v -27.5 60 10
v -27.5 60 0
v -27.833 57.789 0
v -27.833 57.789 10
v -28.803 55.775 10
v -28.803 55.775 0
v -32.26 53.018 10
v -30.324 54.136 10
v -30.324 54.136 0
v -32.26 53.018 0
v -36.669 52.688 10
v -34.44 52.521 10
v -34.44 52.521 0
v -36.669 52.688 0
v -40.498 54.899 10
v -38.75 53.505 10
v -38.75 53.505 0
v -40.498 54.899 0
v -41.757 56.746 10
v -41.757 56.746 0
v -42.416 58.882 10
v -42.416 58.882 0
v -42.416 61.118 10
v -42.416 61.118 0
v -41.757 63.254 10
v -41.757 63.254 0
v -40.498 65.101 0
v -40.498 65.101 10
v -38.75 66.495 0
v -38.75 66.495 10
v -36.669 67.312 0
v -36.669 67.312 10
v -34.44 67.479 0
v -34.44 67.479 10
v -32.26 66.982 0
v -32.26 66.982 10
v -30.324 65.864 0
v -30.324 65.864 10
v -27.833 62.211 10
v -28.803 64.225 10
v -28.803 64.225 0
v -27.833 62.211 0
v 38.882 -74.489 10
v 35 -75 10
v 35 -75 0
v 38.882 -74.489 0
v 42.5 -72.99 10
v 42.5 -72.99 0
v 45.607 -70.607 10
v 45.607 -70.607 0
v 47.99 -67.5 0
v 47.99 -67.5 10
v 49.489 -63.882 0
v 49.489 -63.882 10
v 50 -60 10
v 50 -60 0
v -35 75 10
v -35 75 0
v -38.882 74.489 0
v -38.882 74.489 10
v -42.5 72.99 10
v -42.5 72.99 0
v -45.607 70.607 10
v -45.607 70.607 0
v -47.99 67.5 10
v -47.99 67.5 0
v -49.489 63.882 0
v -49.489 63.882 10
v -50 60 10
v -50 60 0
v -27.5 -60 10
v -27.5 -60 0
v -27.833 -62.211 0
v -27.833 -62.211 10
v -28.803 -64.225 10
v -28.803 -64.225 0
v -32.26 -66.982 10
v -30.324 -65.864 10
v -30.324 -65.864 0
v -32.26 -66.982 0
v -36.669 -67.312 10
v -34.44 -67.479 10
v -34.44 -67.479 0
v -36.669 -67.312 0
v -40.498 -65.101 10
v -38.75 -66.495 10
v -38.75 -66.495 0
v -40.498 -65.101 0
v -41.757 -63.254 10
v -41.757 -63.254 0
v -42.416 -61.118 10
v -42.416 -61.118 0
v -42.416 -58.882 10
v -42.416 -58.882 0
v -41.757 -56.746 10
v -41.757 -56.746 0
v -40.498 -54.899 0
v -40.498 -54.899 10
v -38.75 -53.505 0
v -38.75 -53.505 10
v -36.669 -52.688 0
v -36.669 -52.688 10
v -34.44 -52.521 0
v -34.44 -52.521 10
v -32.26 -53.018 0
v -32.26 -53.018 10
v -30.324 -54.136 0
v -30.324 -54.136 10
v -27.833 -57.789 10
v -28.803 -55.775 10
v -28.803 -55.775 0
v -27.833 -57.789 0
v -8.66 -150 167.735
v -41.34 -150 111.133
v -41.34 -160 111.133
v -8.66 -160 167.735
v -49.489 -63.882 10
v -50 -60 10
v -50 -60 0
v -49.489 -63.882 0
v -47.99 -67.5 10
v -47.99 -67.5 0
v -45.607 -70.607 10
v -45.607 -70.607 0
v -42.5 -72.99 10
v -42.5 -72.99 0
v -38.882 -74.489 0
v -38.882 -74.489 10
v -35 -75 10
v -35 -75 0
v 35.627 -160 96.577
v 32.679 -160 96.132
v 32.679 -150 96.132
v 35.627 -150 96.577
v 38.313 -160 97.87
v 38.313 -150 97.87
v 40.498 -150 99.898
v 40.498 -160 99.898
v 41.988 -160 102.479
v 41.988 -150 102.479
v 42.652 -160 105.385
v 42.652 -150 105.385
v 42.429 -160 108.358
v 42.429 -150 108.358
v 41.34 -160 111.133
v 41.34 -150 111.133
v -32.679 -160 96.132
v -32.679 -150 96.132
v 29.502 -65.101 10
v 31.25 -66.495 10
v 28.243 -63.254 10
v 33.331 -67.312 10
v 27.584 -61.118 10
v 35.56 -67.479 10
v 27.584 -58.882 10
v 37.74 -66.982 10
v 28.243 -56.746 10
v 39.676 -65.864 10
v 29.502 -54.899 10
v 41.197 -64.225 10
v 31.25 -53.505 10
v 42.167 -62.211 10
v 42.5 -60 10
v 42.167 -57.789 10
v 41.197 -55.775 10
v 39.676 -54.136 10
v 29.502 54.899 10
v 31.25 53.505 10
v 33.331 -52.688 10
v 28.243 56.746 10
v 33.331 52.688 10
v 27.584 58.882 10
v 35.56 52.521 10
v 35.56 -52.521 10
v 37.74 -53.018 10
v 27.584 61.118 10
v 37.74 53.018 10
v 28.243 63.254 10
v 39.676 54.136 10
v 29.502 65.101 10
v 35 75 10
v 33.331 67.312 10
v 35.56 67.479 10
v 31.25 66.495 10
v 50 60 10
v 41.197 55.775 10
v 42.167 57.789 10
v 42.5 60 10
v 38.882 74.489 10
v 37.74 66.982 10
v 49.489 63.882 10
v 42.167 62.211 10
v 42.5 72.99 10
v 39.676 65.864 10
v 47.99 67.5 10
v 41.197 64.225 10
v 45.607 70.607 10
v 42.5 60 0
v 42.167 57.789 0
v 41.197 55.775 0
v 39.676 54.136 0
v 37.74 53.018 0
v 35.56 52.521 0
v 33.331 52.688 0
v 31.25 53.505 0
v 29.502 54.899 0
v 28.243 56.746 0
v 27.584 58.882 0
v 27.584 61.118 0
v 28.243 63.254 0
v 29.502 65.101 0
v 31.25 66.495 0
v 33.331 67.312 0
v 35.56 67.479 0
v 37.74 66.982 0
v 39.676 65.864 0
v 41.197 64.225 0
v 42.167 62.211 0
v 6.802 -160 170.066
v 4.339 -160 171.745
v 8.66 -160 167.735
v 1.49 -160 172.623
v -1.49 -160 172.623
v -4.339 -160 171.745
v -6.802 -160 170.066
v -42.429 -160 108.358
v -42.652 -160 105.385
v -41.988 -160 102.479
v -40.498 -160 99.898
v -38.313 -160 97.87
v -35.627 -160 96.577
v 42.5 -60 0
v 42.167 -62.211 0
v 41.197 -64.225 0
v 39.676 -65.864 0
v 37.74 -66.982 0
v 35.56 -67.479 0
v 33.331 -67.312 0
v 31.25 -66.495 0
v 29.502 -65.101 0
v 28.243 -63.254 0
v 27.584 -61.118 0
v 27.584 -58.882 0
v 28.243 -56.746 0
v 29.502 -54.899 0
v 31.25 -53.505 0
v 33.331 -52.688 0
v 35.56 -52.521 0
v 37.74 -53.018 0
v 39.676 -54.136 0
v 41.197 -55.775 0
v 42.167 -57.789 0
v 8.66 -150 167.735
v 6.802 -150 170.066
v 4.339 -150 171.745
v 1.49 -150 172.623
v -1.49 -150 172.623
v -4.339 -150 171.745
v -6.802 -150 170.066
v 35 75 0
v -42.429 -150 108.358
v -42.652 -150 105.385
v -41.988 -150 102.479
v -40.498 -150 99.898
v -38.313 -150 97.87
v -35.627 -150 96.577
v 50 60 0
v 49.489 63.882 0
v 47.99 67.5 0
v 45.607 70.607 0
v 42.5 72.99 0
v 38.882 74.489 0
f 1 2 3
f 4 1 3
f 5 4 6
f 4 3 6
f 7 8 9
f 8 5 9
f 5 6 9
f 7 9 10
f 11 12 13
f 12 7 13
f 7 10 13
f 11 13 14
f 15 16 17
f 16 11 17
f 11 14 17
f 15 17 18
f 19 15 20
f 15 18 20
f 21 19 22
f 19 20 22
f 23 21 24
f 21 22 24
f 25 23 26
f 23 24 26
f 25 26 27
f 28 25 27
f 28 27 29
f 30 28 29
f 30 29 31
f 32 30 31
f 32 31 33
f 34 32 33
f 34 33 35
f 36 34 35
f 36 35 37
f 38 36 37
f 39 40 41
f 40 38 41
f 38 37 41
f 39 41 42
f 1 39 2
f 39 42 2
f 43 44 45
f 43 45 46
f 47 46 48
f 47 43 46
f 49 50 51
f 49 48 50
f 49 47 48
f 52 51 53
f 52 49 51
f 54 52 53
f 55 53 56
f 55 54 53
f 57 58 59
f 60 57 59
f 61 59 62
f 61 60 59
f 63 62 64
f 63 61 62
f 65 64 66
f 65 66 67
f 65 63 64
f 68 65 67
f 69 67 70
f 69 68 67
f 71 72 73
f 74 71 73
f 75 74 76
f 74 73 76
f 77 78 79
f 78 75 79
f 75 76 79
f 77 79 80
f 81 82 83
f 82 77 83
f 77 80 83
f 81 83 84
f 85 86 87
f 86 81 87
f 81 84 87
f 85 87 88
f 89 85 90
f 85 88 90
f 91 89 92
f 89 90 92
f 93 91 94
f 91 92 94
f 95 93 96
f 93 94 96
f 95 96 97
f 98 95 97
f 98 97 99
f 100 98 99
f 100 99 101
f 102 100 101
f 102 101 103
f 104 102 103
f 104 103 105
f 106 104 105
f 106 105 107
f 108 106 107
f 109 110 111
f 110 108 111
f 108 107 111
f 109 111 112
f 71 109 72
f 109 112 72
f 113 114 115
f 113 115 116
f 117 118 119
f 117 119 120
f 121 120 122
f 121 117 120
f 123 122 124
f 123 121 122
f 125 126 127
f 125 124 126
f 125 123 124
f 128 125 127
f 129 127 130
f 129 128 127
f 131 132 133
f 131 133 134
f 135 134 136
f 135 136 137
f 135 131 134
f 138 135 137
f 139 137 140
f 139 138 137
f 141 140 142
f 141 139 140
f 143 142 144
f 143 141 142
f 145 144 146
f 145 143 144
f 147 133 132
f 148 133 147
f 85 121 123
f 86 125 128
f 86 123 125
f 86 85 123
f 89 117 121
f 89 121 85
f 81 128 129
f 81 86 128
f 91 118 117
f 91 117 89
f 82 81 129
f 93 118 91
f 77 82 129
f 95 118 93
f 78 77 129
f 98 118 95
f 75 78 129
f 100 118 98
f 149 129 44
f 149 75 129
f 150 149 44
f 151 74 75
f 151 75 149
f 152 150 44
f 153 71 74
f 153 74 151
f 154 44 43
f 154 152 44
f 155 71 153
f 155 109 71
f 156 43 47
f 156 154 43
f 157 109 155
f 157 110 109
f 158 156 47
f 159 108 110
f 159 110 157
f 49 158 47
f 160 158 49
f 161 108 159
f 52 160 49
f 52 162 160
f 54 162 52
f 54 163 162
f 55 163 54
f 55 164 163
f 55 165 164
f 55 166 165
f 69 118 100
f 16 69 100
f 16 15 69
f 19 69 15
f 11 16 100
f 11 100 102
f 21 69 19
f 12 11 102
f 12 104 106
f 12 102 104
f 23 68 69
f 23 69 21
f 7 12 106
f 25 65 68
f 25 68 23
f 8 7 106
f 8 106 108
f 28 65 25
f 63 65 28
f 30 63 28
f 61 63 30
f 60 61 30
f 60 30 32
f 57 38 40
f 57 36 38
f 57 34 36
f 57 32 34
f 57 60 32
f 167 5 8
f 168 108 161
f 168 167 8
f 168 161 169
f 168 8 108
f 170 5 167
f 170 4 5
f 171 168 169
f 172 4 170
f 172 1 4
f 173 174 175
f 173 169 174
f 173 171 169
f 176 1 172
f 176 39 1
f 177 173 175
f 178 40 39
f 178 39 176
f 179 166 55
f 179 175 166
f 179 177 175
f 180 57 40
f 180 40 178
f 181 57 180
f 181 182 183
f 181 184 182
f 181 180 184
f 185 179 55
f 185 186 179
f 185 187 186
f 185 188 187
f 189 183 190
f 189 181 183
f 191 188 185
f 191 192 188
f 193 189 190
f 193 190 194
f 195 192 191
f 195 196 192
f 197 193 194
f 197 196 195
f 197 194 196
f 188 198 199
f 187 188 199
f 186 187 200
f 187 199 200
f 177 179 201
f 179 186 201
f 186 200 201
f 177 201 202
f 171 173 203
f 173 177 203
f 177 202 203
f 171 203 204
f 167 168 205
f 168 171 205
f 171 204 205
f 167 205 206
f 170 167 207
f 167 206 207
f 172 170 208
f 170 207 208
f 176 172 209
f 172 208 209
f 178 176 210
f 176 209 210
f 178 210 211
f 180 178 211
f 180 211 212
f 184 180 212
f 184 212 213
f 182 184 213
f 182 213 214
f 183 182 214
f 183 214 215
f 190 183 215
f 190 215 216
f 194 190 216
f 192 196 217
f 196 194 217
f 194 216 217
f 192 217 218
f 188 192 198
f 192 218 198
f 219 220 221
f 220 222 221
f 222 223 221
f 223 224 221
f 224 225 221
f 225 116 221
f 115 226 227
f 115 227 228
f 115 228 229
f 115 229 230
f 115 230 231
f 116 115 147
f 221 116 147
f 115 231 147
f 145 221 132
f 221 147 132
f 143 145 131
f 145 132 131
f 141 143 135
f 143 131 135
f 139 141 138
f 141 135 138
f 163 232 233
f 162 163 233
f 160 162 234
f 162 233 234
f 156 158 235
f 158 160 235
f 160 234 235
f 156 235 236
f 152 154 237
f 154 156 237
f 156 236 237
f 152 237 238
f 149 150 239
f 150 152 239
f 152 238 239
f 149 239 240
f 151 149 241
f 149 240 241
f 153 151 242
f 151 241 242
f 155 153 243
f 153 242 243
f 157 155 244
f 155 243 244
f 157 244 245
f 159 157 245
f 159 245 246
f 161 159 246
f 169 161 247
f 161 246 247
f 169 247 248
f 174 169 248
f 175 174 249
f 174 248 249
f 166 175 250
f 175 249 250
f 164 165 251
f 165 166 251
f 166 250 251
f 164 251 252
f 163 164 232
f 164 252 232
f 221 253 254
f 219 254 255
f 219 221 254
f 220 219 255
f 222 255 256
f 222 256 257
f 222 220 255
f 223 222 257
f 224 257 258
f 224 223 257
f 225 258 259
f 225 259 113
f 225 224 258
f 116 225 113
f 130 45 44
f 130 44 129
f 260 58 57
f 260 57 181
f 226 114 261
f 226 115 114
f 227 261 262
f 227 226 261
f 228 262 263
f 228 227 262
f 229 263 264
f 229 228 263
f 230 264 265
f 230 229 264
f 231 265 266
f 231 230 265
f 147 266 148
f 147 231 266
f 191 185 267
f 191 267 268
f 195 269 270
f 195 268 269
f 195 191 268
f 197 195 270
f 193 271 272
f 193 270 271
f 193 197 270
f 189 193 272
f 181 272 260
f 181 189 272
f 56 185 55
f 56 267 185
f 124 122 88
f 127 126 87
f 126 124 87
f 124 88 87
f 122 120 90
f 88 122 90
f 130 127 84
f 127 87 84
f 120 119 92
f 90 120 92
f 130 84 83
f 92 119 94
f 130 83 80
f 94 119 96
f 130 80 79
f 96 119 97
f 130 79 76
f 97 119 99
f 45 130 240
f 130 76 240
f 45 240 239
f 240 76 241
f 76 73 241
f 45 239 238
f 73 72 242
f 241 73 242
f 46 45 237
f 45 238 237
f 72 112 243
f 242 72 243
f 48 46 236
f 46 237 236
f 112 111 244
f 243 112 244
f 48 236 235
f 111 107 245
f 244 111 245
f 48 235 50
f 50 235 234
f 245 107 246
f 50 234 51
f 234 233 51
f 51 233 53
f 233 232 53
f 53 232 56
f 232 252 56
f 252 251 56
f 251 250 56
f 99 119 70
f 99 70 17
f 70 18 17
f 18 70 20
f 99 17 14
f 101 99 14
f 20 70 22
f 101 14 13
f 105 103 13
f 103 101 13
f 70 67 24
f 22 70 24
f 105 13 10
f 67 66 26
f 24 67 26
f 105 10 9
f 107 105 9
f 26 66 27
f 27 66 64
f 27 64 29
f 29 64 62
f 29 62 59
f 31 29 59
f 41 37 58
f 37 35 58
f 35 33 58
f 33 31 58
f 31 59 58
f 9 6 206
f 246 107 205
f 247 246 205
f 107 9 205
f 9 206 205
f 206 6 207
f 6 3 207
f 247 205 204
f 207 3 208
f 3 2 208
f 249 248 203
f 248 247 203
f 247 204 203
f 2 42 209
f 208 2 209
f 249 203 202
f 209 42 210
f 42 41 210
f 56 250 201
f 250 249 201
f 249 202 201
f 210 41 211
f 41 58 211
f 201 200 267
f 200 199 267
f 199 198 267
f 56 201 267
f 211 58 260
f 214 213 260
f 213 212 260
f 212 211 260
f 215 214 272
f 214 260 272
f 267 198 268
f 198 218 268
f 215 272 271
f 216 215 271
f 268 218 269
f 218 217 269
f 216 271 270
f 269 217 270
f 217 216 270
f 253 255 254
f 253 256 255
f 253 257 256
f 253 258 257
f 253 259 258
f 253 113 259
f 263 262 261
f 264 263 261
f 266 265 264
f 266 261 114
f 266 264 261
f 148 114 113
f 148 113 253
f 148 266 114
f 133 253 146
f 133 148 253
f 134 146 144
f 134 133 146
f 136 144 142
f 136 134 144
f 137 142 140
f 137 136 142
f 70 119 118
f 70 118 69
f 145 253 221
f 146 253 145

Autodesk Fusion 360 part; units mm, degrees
sketch "Sketch1" plane through (0, 0, 0) normal (0, 0, 1) x (1, 0, 0) in component "Mounting Plate1"
  line L0 (-50, 75) -> (50, 75)
  line L1 (50, 75) -> (50, -75)
  line L2 (50, -75) -> (-50, -75)
  line L3 (-50, -75) -> (-50, 75)
  line L4 (-50, 75) -> (50, -75) construction
  line L5 (50, 75) -> (-50, -75) construction
  circle A0 centre (-35, 60) radius 7.5
  circle A1 centre (35, 60) radius 7.5
  line L6 (0, 0) -> (21.7934, 0) construction
  circle A2 centre (-35, -60) radius 7.5
  circle A3 centre (35, -60) radius 7.5
  dimension "d1" = 100
  dimension "d2" = 150
  dimension "d3" = 15
  dimension "d4" = 15
  dimension "d5" = 15
  dimension "d6" = 15
extrude "Extrude1" add sketch "Sketch1" along normal blind 10 makes body 1 in component "Mounting Plate1"
fillet "Fillet1" radius 15 4 edges at (-50, 75, 5) (50, 75, 5) (50, -75, 5) (-50, -75, 5) on bodies 1 in component "Mounting Plate1"
ref_plane "WorkPlane1" through (0, -150, 0) normal (0, 1, 0) x (0, 0, 1) in component "Mounting Plate1"
sketch "Sketch2" plane through (0, -150, 0) normal (0, 1, 0) x (1, 0, 0) in component "Mounting Plate1"
  line L0 (-35, -10) -> (35, -10)
  line L1 (0, 0) -> (0, -125) construction
  line L2 (-50, -96.1325) -> (0, -182.735)
  line L3 (0, -182.735) -> (50, -96.1325)
  line L4 (50, -96.1325) -> (-50, -96.1325)
  point P0 (0, -125)
  dimension "d11" = 125
  dimension "d12" = 100
extrude "Extrude2" add sketch "Sketch2" against normal blind 10 separate body makes body 2 in component "Mounting Plate1"
fillet "Fillet2" radius 10 3 edges at (0, -155, 182.735) (50, -155, 96.1325) (-50, -155, 96.1325) on bodies 2 in component "Mounting Plate1"
component "Mounting Plate1" placed x (1, 0, 0) y (0, 1, 0) z (0, 0, 1) at (0, 0, 0)
equation "d2 = ( 6 * 25 ) * 1 mm"
